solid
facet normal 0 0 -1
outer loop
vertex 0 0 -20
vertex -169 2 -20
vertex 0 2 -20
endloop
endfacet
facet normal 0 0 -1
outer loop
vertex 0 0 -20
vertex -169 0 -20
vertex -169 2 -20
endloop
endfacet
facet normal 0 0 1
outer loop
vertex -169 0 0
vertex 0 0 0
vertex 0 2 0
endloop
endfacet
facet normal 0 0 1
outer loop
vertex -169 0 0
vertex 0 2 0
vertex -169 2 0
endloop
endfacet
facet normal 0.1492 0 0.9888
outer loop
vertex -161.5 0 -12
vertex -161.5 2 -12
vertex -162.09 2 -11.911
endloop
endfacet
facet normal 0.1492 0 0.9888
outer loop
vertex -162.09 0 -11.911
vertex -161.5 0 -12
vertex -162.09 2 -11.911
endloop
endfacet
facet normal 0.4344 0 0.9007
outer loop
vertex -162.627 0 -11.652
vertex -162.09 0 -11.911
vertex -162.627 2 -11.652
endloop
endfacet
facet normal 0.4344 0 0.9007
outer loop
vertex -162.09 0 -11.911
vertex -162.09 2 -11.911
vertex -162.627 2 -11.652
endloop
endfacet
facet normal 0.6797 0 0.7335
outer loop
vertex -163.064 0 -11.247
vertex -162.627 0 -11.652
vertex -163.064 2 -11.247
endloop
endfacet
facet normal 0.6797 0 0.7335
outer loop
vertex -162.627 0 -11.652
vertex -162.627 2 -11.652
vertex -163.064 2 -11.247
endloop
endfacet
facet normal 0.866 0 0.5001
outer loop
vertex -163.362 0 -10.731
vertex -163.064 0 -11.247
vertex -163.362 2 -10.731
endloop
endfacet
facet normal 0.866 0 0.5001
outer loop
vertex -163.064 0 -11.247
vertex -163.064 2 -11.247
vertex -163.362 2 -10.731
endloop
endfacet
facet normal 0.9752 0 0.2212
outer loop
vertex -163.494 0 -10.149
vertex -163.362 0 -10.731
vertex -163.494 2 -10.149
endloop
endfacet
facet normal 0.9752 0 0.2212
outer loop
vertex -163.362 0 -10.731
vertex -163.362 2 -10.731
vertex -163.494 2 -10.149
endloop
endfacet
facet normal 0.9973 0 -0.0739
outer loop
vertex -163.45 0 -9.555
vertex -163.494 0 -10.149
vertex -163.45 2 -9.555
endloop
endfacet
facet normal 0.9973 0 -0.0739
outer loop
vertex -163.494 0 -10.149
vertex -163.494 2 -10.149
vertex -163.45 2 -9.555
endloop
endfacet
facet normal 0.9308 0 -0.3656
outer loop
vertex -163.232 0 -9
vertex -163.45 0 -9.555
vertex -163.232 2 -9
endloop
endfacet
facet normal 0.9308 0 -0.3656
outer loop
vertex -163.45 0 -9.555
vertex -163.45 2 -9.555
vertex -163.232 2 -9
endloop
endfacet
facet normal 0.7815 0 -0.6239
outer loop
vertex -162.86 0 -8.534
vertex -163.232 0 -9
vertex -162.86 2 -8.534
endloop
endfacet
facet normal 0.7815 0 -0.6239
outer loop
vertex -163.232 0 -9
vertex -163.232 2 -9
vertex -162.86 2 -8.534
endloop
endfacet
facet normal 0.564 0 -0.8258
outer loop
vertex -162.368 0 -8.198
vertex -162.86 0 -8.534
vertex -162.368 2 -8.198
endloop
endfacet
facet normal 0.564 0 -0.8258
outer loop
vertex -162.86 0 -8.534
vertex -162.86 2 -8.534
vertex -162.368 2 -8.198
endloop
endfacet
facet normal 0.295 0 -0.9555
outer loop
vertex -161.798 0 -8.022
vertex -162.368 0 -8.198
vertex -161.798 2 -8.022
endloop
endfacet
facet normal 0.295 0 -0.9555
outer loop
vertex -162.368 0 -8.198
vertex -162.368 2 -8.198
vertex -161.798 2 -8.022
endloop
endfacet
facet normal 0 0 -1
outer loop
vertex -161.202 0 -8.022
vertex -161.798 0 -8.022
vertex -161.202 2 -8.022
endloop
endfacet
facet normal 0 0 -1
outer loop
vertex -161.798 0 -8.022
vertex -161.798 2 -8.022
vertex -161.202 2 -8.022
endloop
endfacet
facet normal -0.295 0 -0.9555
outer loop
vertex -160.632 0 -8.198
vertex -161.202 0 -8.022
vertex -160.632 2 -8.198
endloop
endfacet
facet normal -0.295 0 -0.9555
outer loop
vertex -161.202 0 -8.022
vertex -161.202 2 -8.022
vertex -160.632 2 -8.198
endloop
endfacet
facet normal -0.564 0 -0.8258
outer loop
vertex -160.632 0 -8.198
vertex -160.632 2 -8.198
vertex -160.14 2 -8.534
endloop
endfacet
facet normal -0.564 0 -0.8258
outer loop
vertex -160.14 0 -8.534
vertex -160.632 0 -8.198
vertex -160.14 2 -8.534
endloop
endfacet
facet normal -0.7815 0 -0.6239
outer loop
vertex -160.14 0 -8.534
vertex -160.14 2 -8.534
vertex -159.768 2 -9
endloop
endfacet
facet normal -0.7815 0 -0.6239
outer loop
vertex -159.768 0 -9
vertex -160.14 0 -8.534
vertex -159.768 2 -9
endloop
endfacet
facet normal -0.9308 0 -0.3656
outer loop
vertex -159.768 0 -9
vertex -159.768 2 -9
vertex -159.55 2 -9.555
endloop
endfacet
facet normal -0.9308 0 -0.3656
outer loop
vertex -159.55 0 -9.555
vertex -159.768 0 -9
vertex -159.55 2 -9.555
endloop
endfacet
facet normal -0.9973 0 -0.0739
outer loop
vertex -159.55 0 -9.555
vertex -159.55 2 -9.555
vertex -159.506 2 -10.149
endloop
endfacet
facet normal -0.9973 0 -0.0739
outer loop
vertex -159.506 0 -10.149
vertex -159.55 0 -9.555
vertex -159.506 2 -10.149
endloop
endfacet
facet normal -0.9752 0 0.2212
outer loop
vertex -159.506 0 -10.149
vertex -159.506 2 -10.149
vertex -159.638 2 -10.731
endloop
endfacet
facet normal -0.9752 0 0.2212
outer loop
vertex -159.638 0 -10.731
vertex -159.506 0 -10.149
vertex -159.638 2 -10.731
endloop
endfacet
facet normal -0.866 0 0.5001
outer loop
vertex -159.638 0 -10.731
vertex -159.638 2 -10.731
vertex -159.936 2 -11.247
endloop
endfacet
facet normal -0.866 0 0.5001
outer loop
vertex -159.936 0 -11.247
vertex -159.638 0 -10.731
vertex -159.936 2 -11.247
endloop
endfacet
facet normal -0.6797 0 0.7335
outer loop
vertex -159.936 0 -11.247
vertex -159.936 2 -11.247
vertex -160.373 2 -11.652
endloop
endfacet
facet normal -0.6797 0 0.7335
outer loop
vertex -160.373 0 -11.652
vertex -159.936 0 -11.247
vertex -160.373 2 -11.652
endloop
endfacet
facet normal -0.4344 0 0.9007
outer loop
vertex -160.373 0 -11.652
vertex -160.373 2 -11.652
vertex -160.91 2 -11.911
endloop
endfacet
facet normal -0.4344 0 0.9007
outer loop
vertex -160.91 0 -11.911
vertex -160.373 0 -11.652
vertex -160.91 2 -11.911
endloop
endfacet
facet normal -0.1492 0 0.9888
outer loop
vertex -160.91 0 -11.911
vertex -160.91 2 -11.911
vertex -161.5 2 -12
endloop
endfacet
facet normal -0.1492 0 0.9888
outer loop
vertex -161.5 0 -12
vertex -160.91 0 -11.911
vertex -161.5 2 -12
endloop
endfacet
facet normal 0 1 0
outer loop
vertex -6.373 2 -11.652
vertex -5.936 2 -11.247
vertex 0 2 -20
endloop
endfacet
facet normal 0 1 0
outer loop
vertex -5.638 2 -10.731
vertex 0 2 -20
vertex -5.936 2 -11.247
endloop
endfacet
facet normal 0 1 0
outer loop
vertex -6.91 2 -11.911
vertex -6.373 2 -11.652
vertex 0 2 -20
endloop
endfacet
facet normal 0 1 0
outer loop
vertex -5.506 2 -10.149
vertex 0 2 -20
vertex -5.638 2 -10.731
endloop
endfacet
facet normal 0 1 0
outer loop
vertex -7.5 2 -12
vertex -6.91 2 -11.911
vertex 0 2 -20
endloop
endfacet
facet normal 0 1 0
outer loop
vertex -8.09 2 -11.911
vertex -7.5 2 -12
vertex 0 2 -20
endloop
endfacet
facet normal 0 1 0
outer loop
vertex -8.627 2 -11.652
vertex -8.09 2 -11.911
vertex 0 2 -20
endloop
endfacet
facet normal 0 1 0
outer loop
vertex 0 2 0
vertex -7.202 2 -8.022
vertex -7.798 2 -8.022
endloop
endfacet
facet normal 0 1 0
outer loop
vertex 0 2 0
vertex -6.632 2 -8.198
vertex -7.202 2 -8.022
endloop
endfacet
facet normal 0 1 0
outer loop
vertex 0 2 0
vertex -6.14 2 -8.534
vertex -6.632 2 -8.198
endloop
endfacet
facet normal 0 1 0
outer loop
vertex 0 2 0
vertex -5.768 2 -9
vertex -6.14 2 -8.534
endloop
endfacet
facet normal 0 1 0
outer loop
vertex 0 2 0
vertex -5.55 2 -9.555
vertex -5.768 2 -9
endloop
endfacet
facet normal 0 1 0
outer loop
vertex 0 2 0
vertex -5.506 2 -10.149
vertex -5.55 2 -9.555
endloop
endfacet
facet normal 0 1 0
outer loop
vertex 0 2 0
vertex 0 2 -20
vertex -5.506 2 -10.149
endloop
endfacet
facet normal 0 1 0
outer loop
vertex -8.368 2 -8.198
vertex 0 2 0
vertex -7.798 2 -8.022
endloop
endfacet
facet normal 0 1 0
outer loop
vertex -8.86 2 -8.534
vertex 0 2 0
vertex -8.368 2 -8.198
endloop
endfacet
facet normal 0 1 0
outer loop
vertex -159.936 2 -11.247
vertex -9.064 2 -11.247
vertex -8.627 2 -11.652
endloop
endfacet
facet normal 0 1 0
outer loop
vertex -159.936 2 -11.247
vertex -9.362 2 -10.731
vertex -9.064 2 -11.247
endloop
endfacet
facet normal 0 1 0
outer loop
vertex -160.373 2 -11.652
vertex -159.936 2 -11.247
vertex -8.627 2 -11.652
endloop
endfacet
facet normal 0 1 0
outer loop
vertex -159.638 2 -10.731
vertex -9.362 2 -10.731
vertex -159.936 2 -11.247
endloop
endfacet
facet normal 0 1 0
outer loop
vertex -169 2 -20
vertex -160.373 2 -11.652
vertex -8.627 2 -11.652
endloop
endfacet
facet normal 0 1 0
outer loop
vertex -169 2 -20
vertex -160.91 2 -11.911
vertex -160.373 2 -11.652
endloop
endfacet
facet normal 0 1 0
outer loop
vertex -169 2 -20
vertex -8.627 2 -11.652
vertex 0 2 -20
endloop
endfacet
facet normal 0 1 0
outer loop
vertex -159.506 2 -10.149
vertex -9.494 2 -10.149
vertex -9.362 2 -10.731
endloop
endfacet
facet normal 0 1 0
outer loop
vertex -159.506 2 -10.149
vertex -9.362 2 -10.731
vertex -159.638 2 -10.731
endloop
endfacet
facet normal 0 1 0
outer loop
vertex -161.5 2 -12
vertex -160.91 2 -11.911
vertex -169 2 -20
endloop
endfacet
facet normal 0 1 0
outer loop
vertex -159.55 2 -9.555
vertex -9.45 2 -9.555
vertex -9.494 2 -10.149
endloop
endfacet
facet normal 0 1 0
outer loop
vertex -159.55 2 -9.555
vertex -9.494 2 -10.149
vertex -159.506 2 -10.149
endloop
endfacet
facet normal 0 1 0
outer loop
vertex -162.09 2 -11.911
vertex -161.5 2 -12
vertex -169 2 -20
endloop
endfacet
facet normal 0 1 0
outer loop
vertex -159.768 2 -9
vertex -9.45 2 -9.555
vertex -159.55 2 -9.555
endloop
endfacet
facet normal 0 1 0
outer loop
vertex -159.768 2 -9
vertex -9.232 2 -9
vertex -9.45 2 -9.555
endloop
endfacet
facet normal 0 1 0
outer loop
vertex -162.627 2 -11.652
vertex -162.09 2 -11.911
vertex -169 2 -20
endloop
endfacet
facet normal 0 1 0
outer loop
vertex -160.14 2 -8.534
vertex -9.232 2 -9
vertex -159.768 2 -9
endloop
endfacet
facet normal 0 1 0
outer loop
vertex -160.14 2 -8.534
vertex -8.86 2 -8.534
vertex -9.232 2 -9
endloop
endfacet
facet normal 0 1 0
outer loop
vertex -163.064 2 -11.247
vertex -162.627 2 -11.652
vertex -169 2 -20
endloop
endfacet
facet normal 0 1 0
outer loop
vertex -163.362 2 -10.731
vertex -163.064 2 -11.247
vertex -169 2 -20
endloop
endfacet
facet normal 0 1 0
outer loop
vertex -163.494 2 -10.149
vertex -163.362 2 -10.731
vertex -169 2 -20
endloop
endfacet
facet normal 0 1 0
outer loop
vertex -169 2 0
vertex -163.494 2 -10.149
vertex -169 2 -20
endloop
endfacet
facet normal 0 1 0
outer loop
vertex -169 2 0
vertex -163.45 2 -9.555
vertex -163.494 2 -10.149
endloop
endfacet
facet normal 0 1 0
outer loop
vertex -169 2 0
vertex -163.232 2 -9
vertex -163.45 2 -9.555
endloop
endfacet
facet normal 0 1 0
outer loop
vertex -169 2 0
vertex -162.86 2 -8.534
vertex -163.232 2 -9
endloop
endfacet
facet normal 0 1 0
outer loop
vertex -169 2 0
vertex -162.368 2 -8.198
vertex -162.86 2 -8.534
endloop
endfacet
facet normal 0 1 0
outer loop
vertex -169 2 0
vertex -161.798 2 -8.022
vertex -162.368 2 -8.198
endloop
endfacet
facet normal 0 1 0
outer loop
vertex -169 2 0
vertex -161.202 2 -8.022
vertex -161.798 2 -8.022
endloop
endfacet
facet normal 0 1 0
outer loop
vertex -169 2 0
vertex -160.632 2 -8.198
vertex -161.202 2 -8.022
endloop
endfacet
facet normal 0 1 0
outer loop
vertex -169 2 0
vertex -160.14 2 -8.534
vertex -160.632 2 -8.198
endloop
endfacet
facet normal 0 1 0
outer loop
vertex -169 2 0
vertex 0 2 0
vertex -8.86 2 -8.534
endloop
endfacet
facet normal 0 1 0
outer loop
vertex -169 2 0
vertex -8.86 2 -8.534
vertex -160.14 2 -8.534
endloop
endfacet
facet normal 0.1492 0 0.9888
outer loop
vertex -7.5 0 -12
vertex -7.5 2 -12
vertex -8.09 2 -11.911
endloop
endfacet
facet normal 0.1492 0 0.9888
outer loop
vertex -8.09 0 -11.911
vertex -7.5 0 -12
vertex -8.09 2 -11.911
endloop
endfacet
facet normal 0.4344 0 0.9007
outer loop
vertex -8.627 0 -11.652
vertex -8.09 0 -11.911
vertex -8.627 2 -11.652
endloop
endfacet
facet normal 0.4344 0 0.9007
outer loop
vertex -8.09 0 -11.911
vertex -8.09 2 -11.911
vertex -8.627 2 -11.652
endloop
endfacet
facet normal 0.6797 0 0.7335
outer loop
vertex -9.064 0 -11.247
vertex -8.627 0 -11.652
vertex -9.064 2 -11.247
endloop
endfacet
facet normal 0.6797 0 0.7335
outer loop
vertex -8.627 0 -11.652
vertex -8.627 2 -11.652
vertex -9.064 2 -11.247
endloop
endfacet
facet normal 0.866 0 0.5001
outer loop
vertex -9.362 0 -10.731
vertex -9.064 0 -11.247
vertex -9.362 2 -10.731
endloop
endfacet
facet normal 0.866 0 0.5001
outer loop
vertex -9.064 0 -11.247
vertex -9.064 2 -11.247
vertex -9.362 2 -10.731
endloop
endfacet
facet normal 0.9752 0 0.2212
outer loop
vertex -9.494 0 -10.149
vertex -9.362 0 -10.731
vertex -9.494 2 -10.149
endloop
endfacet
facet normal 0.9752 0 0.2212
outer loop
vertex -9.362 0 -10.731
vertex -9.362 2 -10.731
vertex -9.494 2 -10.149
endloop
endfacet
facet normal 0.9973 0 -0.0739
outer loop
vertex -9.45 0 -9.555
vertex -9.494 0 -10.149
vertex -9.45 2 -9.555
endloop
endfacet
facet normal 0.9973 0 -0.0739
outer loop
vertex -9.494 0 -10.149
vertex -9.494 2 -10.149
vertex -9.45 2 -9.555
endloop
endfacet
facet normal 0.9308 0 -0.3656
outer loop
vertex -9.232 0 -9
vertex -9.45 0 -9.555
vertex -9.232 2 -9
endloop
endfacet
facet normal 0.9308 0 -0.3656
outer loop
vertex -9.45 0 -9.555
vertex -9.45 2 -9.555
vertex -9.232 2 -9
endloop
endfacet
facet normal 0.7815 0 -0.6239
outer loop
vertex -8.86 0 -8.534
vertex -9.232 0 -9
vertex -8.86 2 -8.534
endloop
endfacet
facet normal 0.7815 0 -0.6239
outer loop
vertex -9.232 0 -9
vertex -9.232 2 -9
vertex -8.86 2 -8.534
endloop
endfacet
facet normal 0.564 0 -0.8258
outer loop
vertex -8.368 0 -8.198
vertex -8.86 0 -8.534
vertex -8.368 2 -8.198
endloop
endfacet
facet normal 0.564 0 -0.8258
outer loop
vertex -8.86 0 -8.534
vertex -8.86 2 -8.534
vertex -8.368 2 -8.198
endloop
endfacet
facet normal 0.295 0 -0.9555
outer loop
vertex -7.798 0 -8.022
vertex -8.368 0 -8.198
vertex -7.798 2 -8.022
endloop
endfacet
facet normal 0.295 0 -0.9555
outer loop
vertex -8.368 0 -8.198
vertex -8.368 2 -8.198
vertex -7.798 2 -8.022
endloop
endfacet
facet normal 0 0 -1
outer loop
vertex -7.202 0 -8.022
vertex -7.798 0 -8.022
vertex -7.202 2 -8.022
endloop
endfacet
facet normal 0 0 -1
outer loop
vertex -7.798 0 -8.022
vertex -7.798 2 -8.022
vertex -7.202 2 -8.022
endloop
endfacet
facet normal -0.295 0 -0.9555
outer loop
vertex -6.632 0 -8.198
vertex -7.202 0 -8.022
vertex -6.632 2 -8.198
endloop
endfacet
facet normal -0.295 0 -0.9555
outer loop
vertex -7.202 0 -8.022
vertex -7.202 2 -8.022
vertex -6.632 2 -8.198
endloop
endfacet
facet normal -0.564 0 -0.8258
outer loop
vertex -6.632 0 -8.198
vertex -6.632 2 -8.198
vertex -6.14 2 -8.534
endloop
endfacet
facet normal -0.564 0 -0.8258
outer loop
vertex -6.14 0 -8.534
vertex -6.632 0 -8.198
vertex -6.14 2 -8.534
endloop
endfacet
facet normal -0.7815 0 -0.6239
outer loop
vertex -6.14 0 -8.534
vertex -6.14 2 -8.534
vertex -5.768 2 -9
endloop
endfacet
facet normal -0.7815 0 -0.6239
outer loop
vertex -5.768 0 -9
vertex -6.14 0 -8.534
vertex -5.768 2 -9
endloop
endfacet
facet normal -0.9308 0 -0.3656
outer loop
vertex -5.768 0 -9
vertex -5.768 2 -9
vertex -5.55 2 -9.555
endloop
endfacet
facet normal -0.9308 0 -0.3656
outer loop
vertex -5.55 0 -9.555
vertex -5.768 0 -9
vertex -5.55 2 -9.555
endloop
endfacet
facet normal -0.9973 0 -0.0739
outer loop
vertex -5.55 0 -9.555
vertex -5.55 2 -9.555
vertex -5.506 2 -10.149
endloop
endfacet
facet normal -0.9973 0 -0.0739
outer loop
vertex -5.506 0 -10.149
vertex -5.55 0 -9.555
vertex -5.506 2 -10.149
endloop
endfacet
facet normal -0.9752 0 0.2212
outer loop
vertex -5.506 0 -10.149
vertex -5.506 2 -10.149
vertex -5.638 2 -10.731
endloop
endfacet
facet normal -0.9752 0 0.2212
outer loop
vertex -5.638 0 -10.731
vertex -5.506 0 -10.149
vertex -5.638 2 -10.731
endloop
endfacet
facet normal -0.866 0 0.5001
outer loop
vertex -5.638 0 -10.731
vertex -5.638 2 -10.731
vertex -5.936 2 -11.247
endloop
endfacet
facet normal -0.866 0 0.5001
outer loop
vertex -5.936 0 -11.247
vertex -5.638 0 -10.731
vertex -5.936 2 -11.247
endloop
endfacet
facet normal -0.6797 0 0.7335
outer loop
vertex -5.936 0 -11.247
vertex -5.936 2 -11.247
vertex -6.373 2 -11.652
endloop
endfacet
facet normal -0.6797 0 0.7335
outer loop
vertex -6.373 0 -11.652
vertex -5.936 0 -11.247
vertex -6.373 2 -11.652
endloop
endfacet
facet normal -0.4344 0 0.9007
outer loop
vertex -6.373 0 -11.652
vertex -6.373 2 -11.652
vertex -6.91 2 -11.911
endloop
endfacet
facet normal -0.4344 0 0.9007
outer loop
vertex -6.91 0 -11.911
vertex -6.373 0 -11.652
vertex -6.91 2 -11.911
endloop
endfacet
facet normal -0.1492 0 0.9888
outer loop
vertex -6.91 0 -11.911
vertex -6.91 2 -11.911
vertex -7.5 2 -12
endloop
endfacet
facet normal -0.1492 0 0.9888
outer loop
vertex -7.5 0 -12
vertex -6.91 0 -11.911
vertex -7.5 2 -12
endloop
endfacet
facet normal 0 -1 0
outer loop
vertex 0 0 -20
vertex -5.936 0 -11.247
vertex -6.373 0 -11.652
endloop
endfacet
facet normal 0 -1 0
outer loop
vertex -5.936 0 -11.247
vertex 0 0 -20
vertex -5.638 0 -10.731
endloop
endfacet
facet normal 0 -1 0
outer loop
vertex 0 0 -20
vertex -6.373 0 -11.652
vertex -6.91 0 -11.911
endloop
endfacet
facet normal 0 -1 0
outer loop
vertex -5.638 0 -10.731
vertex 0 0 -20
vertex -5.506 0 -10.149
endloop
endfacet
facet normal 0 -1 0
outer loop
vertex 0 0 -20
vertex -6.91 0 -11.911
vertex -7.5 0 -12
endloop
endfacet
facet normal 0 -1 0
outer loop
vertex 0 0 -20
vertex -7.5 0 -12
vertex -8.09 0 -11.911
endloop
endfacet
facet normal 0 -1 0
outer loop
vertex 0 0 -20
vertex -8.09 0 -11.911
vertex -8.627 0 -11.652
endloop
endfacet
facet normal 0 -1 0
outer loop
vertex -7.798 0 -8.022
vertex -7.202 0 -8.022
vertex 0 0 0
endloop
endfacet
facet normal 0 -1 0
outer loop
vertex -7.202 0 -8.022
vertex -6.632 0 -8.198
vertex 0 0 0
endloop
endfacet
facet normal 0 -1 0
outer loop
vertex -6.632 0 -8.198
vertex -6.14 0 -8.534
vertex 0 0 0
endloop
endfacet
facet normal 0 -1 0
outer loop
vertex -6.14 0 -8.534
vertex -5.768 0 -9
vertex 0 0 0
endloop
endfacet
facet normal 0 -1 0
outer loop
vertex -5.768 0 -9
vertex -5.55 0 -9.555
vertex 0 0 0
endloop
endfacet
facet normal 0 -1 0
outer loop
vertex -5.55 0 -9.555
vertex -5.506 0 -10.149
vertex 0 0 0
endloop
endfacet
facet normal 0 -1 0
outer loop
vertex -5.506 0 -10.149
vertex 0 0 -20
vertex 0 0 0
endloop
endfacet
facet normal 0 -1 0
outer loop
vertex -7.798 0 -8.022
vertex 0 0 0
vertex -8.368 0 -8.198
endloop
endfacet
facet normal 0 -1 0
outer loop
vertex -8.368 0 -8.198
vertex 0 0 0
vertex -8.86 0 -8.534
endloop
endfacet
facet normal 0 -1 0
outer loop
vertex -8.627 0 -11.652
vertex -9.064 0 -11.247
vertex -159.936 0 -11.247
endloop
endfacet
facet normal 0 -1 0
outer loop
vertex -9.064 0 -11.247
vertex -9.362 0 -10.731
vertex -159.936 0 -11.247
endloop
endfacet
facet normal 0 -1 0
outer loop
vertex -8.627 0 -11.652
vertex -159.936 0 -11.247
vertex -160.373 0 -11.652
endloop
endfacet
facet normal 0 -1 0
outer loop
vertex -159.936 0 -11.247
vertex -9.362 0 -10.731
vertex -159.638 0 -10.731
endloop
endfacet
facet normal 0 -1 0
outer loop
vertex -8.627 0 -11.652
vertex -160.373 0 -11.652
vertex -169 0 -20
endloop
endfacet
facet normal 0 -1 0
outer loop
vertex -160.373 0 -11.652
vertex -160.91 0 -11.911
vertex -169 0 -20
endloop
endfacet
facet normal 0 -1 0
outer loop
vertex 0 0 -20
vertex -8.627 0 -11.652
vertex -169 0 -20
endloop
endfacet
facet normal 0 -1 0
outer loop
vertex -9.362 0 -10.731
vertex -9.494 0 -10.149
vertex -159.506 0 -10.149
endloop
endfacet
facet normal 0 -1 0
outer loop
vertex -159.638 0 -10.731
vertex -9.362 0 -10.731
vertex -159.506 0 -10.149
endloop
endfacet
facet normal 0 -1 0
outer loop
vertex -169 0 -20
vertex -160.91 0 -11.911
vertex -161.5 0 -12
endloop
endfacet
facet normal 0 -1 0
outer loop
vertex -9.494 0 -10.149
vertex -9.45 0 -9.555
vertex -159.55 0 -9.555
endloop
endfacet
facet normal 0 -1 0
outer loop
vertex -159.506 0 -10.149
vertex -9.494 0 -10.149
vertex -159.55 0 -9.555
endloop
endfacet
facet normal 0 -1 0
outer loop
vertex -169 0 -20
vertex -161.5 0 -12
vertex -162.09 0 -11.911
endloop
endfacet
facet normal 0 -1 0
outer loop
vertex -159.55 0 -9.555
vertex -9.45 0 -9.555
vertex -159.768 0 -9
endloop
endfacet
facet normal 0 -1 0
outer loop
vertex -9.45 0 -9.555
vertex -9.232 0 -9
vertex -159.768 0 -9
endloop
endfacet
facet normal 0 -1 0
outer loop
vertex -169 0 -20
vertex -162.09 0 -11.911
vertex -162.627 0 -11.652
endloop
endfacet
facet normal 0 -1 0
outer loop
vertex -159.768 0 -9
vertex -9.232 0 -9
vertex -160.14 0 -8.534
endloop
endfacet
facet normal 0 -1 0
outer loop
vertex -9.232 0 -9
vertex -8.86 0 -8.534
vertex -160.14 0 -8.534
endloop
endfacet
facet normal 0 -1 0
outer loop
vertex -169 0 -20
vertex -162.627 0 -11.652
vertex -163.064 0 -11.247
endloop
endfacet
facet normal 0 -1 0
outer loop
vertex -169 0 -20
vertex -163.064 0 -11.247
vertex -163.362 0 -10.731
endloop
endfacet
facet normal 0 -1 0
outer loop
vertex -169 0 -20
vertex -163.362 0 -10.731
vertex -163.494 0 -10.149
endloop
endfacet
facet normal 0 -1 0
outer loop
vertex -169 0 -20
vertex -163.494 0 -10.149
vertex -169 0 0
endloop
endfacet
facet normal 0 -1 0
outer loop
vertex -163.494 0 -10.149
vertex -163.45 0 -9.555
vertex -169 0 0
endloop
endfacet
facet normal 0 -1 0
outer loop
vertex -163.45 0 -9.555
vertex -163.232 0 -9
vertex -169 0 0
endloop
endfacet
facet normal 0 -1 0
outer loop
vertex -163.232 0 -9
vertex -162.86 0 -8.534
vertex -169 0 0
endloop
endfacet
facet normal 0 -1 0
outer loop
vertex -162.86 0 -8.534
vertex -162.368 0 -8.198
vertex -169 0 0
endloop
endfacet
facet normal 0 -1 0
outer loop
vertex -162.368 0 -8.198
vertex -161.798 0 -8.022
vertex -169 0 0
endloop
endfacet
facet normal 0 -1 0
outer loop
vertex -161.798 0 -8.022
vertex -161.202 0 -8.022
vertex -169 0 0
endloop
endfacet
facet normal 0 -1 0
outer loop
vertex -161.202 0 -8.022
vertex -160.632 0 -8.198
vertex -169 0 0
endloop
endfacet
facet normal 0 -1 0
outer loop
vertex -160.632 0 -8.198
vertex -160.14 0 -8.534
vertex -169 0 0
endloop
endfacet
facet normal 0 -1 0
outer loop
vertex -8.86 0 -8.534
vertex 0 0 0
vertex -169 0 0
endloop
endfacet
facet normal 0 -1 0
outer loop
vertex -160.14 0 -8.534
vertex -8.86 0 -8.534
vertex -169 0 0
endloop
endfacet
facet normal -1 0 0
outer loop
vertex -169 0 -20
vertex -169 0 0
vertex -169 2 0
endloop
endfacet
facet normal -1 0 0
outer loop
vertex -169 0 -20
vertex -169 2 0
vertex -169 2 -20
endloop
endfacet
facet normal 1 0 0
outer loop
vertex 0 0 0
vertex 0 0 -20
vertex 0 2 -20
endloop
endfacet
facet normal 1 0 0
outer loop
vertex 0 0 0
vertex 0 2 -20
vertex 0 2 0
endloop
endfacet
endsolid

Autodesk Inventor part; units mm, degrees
ref_plane "YZ Plane" through (0, 0, 0) normal (1, 0, 0) x (0, 1, 0)
ref_plane "XZ Plane" through (0, 0, 0) normal (0, 1, 0) x (-1, 0, 0)
ref_plane "XY Plane" through (0, 0, 0) normal (0, 0, 1) x (1, 0, 0)
sketch "Sketch1" plane through (0, 0, 0) normal (0, 1, 0) x (-1, 0, 0)
  line L0 (0, 0) -> (169, 0)
  line L1 (169, 0) -> (169, -20)
  line L2 (169, -20) -> (0, -20)
  line L3 (0, -20) -> (0, 0)
  dimension "d0" = 169
  dimension "d1" = 20
extrude "Extrusion1" add sketch "Sketch1" along normal blind 2
sketch "Sketch2" plane through (0, 0, 0) normal (0, -1, 0) x (1, 0, 0)
  line L0 (0, 0) -> (0, -20) projected
  line L1 (0, -10) -> (-169, -10) construction
  line L2 (-169, -20) -> (-169, 0) projected
  line L3 (-84.5, -10) -> (-84.5, 52.7002) construction
  point P0 (-161.5, -10)
  point P1 (-7.5, -10)
  dimension "d6" = 154
hole "Hole1" at (-161.5, 0, -10) at (-7.5, 0, -10) direction (0, 1, 0) diameter 4 end through all
sketch "Sketch3" plane through (0, 0, 0) normal (0, -1, 0) x (1, 0, 0)
  line L0 (-169, -20) -> (-169, 0) construction
  line L1 (-169, -10) -> (0, -10) construction
  line L2 (0, 0) -> (0, -20) construction
  line L3 (-169, 0.75) -> (0, 0.75)
  line L4 (-169, 0.75) -> (-169, -10)
  line L5 (0, 0.75) -> (0, -10)
  line L6 (-169, -20.75) -> (0, -20.75)
  line L7 (-169, -20.75) -> (-169, -10)
  line L8 (0, -20.75) -> (0, -10)
  dimension "d15" = 21.5
extrude "Extrusion2" cut sketch "Sketch3" against normal blind 10 keep common part
properties part number "ballastBar" material "Steel"
